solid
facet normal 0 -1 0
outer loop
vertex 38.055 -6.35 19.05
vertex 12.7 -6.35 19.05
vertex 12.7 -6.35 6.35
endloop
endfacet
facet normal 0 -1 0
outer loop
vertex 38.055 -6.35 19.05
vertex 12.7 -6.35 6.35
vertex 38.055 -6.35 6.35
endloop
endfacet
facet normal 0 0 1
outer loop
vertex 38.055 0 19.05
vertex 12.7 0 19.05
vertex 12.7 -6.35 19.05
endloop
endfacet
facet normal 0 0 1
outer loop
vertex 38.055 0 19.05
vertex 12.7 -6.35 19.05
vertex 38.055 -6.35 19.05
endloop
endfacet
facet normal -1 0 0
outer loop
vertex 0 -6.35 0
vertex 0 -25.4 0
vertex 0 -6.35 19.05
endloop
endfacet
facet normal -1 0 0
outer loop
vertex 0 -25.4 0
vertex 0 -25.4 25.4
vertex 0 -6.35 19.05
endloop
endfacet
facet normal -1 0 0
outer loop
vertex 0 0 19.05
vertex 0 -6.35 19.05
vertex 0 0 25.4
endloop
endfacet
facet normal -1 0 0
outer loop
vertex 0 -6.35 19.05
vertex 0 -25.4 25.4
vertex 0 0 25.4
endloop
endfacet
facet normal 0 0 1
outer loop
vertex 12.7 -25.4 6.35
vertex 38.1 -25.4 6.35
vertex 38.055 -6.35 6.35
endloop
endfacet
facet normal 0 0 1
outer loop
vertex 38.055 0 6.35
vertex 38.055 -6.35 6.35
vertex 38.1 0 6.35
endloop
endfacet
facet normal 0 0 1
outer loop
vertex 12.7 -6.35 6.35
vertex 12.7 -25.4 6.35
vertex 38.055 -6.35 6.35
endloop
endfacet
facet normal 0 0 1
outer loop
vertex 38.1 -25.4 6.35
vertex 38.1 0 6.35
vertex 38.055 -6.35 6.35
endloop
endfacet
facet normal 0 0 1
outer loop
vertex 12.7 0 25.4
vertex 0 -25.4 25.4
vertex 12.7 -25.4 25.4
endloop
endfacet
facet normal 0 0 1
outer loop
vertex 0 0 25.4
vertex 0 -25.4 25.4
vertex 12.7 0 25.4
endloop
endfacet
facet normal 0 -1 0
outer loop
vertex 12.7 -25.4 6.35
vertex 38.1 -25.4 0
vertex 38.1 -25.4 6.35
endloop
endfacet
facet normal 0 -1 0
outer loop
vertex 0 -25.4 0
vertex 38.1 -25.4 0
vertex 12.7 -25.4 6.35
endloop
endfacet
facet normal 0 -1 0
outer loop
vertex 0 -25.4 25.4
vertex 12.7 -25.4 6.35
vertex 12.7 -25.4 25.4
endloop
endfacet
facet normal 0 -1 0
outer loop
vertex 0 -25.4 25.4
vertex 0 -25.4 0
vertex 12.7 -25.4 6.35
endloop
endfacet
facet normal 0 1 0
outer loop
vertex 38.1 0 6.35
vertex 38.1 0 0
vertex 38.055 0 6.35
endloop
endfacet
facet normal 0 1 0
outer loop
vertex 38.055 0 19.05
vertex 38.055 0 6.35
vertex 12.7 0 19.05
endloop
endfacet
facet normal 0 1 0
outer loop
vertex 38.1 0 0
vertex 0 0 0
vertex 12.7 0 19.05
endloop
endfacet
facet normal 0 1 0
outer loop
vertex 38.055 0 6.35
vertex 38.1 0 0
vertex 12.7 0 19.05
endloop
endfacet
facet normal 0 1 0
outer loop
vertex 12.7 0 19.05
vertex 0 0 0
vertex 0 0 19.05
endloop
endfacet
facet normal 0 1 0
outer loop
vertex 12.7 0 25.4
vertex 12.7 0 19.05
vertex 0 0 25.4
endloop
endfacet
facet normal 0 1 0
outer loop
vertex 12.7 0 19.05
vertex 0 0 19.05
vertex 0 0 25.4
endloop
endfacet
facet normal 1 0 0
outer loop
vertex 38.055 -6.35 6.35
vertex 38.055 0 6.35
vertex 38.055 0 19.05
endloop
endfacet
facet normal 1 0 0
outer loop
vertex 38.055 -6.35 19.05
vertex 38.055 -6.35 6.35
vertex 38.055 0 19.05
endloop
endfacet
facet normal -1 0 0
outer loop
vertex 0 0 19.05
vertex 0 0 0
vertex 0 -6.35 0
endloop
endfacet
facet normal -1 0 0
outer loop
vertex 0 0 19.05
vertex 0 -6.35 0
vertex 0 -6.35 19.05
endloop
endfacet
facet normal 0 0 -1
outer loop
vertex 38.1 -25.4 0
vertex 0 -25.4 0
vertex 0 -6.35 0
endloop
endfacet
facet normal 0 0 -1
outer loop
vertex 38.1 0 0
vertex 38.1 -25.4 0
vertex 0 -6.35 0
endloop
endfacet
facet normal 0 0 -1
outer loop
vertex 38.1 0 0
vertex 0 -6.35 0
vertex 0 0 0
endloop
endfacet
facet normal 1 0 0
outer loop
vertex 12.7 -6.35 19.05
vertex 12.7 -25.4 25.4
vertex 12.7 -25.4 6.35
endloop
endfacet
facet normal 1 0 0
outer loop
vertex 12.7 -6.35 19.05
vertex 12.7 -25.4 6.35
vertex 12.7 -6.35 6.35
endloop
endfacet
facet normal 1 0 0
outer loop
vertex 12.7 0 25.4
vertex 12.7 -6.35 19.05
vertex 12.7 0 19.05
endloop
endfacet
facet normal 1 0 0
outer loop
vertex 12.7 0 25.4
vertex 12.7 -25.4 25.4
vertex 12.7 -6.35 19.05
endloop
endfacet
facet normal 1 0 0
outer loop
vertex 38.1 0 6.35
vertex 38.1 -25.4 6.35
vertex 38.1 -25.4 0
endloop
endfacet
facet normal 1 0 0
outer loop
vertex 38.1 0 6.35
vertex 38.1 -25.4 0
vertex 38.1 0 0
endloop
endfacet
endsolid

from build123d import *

# Parameters (mm, degrees)
F0_W     = 38.054697
F0_H     = 19.05
F1_DEPTH = 6.35
F2_W     = 25.4
F2_H     = 6.35
F3_DEPTH = 38.1
F4_W     = 25.4
F4_H     = 25.4
F5_DEPTH = 12.7


with BuildPart() as f1:
    # F0 (on Front) → F1 (new body)
    with BuildSketch(Plane.XZ):
        with Locations((19.027348, 9.525)):
            Rectangle(F0_W, F0_H)
    extrude(amount=F1_DEPTH)

    # F2 (on Right) → F3 (join)
    with BuildSketch(Plane.YZ):
        with Locations((-12.7, 3.175)):
            Rectangle(F2_W, F2_H)
    extrude(amount=F3_DEPTH)

    # F4 (on Right) → F5 (join)
    with BuildSketch(Plane.YZ):
        with Locations((-12.7, 12.7)):
            Rectangle(F4_W, F4_H)
    extrude(amount=F5_DEPTH)


solid = f1.part
